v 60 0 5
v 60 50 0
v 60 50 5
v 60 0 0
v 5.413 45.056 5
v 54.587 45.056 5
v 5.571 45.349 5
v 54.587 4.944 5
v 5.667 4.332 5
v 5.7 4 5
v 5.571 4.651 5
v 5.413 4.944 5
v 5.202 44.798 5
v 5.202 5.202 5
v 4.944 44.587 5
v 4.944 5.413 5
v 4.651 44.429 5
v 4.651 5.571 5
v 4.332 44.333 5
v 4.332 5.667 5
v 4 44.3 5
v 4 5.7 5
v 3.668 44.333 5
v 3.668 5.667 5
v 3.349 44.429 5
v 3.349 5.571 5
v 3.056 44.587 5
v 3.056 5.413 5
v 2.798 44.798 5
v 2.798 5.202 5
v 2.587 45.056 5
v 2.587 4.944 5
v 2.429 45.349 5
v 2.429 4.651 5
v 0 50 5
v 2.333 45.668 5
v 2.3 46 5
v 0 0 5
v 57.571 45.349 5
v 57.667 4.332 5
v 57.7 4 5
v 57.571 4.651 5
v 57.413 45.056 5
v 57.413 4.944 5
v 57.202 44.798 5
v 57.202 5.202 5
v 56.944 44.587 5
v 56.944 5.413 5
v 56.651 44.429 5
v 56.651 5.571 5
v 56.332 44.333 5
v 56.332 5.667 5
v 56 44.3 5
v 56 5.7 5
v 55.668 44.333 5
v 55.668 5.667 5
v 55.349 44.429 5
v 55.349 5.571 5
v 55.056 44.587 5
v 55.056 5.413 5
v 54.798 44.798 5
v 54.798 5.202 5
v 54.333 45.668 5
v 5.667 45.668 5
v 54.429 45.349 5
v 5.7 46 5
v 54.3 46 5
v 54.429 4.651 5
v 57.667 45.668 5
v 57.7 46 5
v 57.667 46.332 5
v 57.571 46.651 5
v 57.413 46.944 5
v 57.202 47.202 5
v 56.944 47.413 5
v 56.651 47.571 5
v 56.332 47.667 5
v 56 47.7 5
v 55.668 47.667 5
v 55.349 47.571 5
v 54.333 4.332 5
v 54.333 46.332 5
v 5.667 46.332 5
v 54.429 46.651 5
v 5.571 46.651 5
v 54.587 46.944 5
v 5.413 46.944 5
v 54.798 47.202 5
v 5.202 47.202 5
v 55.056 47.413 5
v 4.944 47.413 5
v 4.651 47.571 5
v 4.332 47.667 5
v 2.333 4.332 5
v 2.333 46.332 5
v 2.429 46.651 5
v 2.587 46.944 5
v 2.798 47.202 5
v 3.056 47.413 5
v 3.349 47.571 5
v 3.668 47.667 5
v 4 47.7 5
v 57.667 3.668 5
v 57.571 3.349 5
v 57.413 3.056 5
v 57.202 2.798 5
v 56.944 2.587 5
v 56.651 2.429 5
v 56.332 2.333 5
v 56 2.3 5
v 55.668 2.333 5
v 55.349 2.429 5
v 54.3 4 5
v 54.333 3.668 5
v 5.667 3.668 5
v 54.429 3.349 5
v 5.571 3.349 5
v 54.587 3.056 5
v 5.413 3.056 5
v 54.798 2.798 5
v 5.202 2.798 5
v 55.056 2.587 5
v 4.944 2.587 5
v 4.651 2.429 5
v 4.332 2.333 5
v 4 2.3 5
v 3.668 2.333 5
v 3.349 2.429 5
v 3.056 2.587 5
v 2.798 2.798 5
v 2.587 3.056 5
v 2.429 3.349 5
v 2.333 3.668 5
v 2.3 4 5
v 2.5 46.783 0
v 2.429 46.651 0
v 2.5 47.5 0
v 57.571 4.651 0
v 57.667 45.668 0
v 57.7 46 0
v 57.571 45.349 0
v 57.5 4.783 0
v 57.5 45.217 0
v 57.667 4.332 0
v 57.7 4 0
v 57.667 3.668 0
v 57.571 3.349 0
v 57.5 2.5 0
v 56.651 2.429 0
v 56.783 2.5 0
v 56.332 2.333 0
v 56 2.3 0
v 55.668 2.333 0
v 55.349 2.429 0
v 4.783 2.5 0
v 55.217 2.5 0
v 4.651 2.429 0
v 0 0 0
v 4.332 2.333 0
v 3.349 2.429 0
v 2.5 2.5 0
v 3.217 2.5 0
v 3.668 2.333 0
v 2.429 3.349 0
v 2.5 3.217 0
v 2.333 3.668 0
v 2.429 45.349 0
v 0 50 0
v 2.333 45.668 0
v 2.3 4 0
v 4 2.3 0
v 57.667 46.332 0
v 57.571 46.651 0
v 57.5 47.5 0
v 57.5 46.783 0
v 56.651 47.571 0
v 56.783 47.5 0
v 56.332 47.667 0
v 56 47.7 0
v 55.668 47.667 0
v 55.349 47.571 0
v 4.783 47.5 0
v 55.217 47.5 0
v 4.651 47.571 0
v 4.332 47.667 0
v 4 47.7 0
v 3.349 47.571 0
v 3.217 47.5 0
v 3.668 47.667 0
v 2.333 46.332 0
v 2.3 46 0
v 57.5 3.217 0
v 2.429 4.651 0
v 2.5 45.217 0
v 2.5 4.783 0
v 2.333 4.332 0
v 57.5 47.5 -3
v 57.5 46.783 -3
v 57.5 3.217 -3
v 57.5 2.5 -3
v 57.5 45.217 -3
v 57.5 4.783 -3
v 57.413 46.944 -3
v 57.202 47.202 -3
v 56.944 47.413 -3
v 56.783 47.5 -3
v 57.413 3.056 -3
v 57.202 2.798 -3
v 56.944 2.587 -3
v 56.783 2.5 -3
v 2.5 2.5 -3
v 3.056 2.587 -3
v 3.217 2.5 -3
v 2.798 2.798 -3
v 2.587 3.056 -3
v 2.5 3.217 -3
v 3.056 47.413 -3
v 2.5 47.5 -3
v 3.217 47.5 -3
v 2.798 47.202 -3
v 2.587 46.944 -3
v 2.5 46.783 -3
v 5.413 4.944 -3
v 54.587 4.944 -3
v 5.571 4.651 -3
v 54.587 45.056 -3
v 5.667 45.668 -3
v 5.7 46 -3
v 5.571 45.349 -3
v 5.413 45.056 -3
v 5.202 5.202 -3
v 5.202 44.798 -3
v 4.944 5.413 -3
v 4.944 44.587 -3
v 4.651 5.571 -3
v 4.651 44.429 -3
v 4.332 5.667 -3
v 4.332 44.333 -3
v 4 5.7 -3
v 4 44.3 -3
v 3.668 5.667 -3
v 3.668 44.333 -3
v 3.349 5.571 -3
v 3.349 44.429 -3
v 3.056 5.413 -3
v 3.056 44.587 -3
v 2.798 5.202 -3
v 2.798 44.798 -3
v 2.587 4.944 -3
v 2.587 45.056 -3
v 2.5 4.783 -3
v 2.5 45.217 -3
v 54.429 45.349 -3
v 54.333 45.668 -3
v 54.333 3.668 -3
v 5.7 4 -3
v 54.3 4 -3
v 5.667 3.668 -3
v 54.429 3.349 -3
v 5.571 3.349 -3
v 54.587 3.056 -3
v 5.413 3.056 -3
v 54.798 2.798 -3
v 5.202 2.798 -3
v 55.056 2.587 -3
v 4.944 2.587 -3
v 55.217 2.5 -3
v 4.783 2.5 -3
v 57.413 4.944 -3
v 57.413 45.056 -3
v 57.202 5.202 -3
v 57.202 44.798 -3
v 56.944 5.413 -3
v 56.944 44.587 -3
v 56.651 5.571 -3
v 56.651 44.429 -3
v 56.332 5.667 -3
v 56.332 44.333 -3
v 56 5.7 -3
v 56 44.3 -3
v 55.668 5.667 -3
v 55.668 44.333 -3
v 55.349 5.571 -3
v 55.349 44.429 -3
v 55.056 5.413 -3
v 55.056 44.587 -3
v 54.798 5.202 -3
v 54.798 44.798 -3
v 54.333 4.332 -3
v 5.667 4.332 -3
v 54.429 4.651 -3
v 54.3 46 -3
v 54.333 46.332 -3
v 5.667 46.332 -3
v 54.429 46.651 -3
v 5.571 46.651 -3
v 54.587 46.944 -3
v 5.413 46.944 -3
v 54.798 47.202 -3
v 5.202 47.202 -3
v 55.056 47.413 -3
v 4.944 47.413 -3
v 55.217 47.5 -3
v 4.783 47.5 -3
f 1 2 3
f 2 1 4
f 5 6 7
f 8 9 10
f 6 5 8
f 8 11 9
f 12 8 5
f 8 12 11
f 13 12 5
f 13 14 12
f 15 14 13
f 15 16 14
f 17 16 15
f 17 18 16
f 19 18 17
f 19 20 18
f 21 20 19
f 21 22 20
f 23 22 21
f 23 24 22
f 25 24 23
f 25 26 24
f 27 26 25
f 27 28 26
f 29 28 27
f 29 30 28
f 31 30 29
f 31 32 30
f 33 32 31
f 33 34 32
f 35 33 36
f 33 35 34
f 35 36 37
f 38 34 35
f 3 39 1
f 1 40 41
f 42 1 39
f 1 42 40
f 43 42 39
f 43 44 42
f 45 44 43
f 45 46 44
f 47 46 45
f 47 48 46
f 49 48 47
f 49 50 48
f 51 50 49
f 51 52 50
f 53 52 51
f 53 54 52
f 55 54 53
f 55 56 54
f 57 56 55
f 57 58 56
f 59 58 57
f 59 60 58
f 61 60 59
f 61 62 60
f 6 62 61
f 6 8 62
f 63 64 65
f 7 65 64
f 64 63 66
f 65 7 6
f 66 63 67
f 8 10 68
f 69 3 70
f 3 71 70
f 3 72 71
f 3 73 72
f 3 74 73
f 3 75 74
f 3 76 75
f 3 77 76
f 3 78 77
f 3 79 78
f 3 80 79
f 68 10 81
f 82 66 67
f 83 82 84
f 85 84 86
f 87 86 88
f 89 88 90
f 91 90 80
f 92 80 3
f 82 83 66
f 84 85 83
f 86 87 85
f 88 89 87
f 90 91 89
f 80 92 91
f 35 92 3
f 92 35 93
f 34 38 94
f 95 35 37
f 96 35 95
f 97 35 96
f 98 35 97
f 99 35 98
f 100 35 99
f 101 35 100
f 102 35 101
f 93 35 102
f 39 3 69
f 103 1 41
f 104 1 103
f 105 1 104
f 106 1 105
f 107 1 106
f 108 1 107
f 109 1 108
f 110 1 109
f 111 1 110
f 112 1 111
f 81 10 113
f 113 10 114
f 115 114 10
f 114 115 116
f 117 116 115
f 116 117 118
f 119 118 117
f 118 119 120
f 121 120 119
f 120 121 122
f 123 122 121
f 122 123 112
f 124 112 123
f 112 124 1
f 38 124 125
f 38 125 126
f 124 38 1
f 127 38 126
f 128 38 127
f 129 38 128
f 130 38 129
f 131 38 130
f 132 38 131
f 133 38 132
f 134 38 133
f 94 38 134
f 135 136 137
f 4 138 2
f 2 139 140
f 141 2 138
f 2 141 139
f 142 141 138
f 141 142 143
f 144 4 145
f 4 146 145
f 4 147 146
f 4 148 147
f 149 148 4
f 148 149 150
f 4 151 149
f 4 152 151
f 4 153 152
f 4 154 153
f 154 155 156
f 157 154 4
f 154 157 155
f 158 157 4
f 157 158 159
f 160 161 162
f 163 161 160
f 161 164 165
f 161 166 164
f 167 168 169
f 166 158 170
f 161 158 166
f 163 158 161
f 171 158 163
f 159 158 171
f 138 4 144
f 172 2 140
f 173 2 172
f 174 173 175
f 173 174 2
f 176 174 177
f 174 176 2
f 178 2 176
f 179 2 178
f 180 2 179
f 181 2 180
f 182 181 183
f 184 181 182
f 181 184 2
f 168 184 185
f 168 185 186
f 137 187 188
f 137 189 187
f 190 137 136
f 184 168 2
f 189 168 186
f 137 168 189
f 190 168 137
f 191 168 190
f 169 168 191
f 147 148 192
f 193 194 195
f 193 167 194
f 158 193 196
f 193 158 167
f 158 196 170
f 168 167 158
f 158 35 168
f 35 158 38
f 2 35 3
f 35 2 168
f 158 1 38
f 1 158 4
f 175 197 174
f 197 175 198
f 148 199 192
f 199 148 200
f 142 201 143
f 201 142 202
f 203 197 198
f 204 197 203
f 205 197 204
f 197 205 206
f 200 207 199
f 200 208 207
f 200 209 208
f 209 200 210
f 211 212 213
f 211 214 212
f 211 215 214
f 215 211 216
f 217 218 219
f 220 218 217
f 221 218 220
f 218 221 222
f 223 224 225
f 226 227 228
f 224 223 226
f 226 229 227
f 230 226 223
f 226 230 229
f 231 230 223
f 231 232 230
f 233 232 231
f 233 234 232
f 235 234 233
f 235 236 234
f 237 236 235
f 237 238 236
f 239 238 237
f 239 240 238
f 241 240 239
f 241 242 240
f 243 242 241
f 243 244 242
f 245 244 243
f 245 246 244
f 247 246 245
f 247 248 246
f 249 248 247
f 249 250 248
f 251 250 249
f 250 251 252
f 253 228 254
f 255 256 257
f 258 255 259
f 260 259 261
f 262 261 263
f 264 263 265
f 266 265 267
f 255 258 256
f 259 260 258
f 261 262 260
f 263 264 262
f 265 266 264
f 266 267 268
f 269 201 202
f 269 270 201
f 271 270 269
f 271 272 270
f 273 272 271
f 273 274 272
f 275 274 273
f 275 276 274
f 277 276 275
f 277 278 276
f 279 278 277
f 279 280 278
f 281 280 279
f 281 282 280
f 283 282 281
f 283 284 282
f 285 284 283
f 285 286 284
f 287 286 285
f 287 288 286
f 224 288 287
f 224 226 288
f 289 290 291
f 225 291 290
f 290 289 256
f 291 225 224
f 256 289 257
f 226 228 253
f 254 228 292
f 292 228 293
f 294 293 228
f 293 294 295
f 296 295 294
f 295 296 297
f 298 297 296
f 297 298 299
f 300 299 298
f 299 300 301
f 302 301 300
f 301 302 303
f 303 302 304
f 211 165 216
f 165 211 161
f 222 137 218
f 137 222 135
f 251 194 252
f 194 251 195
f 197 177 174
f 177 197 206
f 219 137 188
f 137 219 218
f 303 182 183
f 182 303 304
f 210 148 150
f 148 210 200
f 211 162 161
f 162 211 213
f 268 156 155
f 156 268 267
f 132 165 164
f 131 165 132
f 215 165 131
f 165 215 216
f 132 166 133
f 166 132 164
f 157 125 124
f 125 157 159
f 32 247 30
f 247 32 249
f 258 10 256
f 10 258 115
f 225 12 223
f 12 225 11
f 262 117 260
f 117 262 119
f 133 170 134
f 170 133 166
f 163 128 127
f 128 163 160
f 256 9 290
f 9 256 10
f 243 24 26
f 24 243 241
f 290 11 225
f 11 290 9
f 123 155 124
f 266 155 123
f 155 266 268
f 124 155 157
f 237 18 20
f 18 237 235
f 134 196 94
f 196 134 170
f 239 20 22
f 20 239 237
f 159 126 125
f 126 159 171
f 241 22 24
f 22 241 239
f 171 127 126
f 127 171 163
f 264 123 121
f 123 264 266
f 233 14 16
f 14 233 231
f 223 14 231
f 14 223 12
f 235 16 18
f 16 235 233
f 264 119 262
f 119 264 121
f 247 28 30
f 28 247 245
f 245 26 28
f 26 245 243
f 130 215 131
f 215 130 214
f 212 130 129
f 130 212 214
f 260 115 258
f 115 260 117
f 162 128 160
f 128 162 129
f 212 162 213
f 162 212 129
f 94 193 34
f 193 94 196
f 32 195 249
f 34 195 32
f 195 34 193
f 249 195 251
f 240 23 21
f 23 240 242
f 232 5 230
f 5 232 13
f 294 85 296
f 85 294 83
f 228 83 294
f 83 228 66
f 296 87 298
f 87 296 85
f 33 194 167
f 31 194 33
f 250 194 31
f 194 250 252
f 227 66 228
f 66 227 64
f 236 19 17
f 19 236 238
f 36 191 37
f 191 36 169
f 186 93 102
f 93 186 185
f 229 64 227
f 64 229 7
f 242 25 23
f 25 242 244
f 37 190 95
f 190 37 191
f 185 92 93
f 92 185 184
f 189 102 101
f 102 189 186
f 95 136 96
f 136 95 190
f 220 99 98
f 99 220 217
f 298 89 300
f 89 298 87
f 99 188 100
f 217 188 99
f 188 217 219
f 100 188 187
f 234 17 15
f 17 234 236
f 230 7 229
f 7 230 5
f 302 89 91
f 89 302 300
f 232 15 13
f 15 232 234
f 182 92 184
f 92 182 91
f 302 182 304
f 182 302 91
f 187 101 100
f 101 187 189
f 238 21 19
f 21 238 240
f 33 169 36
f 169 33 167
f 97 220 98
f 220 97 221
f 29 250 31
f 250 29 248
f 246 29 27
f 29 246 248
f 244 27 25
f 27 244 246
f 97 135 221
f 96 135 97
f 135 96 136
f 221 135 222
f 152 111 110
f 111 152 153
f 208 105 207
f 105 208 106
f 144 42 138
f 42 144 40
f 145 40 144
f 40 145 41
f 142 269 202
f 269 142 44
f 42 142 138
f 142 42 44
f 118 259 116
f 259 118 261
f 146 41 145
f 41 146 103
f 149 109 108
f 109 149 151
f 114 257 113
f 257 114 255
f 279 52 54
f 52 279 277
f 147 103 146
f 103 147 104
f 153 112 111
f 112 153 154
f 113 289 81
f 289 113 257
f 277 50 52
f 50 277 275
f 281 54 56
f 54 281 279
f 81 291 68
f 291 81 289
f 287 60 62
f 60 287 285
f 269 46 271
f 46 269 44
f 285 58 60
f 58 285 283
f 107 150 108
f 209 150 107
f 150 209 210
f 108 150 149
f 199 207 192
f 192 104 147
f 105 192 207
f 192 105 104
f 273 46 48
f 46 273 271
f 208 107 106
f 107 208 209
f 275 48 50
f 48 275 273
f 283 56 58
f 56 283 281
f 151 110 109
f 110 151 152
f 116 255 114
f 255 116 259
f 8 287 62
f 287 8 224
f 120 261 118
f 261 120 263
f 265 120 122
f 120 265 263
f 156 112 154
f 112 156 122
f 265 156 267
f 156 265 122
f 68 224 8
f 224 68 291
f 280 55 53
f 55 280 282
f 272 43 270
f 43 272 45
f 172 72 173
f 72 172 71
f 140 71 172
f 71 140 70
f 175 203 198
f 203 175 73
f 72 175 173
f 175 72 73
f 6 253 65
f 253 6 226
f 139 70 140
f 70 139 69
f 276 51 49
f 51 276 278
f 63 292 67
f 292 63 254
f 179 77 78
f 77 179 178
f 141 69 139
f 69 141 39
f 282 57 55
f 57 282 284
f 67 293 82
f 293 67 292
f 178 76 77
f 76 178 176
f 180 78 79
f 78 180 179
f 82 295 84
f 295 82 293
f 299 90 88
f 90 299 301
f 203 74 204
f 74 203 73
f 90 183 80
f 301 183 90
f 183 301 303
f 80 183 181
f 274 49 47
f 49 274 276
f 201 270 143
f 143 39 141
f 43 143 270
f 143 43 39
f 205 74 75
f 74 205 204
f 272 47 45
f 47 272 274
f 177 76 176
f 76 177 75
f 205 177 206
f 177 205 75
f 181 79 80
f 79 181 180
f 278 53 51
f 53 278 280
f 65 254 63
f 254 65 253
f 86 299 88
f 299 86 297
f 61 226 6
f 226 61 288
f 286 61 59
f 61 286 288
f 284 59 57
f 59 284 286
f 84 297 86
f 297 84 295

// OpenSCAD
$fn = 32;

// ----------------------------------------------------------------------
// Enclosure lid: 60 x 50 x 5 mm, 4 bolt holes
// ----------------------------------------------------------------------

// --- parameters (mm) ---
length = 60;              // lid length, X
width = 50;               // lid width, Y
plate_t = 5;              // lid plate thickness
bolt_d = 3.4;             // bolt clearance
boss_lip = 4;             // bolt hole inset from the corner
sink = 1;                 // overlap of the lip and ribs into the plate
lip_h = 4;                // lip height below the plate
lip_wall = 2.5;           // lip wall thickness

module plate() {
  cube([length, width, plate_t]);
  /* lip that drops into the housing opening, sunk into the plate */
  translate([lip_wall, lip_wall, -lip_h + sink]) cube([length - 2 * lip_wall, width - 2 * lip_wall, lip_h]);
}

difference() {
  plate();
  /* bolt pattern matching the corner bosses */
  for (sx = [0, 1]) for (sy = [0, 1])
    translate([sx * (length - 2 * boss_lip) + boss_lip, sy * (width - 2 * boss_lip) + boss_lip, -lip_h - 1])
      cylinder(h = plate_t + lip_h + 2, d = bolt_d);
}
